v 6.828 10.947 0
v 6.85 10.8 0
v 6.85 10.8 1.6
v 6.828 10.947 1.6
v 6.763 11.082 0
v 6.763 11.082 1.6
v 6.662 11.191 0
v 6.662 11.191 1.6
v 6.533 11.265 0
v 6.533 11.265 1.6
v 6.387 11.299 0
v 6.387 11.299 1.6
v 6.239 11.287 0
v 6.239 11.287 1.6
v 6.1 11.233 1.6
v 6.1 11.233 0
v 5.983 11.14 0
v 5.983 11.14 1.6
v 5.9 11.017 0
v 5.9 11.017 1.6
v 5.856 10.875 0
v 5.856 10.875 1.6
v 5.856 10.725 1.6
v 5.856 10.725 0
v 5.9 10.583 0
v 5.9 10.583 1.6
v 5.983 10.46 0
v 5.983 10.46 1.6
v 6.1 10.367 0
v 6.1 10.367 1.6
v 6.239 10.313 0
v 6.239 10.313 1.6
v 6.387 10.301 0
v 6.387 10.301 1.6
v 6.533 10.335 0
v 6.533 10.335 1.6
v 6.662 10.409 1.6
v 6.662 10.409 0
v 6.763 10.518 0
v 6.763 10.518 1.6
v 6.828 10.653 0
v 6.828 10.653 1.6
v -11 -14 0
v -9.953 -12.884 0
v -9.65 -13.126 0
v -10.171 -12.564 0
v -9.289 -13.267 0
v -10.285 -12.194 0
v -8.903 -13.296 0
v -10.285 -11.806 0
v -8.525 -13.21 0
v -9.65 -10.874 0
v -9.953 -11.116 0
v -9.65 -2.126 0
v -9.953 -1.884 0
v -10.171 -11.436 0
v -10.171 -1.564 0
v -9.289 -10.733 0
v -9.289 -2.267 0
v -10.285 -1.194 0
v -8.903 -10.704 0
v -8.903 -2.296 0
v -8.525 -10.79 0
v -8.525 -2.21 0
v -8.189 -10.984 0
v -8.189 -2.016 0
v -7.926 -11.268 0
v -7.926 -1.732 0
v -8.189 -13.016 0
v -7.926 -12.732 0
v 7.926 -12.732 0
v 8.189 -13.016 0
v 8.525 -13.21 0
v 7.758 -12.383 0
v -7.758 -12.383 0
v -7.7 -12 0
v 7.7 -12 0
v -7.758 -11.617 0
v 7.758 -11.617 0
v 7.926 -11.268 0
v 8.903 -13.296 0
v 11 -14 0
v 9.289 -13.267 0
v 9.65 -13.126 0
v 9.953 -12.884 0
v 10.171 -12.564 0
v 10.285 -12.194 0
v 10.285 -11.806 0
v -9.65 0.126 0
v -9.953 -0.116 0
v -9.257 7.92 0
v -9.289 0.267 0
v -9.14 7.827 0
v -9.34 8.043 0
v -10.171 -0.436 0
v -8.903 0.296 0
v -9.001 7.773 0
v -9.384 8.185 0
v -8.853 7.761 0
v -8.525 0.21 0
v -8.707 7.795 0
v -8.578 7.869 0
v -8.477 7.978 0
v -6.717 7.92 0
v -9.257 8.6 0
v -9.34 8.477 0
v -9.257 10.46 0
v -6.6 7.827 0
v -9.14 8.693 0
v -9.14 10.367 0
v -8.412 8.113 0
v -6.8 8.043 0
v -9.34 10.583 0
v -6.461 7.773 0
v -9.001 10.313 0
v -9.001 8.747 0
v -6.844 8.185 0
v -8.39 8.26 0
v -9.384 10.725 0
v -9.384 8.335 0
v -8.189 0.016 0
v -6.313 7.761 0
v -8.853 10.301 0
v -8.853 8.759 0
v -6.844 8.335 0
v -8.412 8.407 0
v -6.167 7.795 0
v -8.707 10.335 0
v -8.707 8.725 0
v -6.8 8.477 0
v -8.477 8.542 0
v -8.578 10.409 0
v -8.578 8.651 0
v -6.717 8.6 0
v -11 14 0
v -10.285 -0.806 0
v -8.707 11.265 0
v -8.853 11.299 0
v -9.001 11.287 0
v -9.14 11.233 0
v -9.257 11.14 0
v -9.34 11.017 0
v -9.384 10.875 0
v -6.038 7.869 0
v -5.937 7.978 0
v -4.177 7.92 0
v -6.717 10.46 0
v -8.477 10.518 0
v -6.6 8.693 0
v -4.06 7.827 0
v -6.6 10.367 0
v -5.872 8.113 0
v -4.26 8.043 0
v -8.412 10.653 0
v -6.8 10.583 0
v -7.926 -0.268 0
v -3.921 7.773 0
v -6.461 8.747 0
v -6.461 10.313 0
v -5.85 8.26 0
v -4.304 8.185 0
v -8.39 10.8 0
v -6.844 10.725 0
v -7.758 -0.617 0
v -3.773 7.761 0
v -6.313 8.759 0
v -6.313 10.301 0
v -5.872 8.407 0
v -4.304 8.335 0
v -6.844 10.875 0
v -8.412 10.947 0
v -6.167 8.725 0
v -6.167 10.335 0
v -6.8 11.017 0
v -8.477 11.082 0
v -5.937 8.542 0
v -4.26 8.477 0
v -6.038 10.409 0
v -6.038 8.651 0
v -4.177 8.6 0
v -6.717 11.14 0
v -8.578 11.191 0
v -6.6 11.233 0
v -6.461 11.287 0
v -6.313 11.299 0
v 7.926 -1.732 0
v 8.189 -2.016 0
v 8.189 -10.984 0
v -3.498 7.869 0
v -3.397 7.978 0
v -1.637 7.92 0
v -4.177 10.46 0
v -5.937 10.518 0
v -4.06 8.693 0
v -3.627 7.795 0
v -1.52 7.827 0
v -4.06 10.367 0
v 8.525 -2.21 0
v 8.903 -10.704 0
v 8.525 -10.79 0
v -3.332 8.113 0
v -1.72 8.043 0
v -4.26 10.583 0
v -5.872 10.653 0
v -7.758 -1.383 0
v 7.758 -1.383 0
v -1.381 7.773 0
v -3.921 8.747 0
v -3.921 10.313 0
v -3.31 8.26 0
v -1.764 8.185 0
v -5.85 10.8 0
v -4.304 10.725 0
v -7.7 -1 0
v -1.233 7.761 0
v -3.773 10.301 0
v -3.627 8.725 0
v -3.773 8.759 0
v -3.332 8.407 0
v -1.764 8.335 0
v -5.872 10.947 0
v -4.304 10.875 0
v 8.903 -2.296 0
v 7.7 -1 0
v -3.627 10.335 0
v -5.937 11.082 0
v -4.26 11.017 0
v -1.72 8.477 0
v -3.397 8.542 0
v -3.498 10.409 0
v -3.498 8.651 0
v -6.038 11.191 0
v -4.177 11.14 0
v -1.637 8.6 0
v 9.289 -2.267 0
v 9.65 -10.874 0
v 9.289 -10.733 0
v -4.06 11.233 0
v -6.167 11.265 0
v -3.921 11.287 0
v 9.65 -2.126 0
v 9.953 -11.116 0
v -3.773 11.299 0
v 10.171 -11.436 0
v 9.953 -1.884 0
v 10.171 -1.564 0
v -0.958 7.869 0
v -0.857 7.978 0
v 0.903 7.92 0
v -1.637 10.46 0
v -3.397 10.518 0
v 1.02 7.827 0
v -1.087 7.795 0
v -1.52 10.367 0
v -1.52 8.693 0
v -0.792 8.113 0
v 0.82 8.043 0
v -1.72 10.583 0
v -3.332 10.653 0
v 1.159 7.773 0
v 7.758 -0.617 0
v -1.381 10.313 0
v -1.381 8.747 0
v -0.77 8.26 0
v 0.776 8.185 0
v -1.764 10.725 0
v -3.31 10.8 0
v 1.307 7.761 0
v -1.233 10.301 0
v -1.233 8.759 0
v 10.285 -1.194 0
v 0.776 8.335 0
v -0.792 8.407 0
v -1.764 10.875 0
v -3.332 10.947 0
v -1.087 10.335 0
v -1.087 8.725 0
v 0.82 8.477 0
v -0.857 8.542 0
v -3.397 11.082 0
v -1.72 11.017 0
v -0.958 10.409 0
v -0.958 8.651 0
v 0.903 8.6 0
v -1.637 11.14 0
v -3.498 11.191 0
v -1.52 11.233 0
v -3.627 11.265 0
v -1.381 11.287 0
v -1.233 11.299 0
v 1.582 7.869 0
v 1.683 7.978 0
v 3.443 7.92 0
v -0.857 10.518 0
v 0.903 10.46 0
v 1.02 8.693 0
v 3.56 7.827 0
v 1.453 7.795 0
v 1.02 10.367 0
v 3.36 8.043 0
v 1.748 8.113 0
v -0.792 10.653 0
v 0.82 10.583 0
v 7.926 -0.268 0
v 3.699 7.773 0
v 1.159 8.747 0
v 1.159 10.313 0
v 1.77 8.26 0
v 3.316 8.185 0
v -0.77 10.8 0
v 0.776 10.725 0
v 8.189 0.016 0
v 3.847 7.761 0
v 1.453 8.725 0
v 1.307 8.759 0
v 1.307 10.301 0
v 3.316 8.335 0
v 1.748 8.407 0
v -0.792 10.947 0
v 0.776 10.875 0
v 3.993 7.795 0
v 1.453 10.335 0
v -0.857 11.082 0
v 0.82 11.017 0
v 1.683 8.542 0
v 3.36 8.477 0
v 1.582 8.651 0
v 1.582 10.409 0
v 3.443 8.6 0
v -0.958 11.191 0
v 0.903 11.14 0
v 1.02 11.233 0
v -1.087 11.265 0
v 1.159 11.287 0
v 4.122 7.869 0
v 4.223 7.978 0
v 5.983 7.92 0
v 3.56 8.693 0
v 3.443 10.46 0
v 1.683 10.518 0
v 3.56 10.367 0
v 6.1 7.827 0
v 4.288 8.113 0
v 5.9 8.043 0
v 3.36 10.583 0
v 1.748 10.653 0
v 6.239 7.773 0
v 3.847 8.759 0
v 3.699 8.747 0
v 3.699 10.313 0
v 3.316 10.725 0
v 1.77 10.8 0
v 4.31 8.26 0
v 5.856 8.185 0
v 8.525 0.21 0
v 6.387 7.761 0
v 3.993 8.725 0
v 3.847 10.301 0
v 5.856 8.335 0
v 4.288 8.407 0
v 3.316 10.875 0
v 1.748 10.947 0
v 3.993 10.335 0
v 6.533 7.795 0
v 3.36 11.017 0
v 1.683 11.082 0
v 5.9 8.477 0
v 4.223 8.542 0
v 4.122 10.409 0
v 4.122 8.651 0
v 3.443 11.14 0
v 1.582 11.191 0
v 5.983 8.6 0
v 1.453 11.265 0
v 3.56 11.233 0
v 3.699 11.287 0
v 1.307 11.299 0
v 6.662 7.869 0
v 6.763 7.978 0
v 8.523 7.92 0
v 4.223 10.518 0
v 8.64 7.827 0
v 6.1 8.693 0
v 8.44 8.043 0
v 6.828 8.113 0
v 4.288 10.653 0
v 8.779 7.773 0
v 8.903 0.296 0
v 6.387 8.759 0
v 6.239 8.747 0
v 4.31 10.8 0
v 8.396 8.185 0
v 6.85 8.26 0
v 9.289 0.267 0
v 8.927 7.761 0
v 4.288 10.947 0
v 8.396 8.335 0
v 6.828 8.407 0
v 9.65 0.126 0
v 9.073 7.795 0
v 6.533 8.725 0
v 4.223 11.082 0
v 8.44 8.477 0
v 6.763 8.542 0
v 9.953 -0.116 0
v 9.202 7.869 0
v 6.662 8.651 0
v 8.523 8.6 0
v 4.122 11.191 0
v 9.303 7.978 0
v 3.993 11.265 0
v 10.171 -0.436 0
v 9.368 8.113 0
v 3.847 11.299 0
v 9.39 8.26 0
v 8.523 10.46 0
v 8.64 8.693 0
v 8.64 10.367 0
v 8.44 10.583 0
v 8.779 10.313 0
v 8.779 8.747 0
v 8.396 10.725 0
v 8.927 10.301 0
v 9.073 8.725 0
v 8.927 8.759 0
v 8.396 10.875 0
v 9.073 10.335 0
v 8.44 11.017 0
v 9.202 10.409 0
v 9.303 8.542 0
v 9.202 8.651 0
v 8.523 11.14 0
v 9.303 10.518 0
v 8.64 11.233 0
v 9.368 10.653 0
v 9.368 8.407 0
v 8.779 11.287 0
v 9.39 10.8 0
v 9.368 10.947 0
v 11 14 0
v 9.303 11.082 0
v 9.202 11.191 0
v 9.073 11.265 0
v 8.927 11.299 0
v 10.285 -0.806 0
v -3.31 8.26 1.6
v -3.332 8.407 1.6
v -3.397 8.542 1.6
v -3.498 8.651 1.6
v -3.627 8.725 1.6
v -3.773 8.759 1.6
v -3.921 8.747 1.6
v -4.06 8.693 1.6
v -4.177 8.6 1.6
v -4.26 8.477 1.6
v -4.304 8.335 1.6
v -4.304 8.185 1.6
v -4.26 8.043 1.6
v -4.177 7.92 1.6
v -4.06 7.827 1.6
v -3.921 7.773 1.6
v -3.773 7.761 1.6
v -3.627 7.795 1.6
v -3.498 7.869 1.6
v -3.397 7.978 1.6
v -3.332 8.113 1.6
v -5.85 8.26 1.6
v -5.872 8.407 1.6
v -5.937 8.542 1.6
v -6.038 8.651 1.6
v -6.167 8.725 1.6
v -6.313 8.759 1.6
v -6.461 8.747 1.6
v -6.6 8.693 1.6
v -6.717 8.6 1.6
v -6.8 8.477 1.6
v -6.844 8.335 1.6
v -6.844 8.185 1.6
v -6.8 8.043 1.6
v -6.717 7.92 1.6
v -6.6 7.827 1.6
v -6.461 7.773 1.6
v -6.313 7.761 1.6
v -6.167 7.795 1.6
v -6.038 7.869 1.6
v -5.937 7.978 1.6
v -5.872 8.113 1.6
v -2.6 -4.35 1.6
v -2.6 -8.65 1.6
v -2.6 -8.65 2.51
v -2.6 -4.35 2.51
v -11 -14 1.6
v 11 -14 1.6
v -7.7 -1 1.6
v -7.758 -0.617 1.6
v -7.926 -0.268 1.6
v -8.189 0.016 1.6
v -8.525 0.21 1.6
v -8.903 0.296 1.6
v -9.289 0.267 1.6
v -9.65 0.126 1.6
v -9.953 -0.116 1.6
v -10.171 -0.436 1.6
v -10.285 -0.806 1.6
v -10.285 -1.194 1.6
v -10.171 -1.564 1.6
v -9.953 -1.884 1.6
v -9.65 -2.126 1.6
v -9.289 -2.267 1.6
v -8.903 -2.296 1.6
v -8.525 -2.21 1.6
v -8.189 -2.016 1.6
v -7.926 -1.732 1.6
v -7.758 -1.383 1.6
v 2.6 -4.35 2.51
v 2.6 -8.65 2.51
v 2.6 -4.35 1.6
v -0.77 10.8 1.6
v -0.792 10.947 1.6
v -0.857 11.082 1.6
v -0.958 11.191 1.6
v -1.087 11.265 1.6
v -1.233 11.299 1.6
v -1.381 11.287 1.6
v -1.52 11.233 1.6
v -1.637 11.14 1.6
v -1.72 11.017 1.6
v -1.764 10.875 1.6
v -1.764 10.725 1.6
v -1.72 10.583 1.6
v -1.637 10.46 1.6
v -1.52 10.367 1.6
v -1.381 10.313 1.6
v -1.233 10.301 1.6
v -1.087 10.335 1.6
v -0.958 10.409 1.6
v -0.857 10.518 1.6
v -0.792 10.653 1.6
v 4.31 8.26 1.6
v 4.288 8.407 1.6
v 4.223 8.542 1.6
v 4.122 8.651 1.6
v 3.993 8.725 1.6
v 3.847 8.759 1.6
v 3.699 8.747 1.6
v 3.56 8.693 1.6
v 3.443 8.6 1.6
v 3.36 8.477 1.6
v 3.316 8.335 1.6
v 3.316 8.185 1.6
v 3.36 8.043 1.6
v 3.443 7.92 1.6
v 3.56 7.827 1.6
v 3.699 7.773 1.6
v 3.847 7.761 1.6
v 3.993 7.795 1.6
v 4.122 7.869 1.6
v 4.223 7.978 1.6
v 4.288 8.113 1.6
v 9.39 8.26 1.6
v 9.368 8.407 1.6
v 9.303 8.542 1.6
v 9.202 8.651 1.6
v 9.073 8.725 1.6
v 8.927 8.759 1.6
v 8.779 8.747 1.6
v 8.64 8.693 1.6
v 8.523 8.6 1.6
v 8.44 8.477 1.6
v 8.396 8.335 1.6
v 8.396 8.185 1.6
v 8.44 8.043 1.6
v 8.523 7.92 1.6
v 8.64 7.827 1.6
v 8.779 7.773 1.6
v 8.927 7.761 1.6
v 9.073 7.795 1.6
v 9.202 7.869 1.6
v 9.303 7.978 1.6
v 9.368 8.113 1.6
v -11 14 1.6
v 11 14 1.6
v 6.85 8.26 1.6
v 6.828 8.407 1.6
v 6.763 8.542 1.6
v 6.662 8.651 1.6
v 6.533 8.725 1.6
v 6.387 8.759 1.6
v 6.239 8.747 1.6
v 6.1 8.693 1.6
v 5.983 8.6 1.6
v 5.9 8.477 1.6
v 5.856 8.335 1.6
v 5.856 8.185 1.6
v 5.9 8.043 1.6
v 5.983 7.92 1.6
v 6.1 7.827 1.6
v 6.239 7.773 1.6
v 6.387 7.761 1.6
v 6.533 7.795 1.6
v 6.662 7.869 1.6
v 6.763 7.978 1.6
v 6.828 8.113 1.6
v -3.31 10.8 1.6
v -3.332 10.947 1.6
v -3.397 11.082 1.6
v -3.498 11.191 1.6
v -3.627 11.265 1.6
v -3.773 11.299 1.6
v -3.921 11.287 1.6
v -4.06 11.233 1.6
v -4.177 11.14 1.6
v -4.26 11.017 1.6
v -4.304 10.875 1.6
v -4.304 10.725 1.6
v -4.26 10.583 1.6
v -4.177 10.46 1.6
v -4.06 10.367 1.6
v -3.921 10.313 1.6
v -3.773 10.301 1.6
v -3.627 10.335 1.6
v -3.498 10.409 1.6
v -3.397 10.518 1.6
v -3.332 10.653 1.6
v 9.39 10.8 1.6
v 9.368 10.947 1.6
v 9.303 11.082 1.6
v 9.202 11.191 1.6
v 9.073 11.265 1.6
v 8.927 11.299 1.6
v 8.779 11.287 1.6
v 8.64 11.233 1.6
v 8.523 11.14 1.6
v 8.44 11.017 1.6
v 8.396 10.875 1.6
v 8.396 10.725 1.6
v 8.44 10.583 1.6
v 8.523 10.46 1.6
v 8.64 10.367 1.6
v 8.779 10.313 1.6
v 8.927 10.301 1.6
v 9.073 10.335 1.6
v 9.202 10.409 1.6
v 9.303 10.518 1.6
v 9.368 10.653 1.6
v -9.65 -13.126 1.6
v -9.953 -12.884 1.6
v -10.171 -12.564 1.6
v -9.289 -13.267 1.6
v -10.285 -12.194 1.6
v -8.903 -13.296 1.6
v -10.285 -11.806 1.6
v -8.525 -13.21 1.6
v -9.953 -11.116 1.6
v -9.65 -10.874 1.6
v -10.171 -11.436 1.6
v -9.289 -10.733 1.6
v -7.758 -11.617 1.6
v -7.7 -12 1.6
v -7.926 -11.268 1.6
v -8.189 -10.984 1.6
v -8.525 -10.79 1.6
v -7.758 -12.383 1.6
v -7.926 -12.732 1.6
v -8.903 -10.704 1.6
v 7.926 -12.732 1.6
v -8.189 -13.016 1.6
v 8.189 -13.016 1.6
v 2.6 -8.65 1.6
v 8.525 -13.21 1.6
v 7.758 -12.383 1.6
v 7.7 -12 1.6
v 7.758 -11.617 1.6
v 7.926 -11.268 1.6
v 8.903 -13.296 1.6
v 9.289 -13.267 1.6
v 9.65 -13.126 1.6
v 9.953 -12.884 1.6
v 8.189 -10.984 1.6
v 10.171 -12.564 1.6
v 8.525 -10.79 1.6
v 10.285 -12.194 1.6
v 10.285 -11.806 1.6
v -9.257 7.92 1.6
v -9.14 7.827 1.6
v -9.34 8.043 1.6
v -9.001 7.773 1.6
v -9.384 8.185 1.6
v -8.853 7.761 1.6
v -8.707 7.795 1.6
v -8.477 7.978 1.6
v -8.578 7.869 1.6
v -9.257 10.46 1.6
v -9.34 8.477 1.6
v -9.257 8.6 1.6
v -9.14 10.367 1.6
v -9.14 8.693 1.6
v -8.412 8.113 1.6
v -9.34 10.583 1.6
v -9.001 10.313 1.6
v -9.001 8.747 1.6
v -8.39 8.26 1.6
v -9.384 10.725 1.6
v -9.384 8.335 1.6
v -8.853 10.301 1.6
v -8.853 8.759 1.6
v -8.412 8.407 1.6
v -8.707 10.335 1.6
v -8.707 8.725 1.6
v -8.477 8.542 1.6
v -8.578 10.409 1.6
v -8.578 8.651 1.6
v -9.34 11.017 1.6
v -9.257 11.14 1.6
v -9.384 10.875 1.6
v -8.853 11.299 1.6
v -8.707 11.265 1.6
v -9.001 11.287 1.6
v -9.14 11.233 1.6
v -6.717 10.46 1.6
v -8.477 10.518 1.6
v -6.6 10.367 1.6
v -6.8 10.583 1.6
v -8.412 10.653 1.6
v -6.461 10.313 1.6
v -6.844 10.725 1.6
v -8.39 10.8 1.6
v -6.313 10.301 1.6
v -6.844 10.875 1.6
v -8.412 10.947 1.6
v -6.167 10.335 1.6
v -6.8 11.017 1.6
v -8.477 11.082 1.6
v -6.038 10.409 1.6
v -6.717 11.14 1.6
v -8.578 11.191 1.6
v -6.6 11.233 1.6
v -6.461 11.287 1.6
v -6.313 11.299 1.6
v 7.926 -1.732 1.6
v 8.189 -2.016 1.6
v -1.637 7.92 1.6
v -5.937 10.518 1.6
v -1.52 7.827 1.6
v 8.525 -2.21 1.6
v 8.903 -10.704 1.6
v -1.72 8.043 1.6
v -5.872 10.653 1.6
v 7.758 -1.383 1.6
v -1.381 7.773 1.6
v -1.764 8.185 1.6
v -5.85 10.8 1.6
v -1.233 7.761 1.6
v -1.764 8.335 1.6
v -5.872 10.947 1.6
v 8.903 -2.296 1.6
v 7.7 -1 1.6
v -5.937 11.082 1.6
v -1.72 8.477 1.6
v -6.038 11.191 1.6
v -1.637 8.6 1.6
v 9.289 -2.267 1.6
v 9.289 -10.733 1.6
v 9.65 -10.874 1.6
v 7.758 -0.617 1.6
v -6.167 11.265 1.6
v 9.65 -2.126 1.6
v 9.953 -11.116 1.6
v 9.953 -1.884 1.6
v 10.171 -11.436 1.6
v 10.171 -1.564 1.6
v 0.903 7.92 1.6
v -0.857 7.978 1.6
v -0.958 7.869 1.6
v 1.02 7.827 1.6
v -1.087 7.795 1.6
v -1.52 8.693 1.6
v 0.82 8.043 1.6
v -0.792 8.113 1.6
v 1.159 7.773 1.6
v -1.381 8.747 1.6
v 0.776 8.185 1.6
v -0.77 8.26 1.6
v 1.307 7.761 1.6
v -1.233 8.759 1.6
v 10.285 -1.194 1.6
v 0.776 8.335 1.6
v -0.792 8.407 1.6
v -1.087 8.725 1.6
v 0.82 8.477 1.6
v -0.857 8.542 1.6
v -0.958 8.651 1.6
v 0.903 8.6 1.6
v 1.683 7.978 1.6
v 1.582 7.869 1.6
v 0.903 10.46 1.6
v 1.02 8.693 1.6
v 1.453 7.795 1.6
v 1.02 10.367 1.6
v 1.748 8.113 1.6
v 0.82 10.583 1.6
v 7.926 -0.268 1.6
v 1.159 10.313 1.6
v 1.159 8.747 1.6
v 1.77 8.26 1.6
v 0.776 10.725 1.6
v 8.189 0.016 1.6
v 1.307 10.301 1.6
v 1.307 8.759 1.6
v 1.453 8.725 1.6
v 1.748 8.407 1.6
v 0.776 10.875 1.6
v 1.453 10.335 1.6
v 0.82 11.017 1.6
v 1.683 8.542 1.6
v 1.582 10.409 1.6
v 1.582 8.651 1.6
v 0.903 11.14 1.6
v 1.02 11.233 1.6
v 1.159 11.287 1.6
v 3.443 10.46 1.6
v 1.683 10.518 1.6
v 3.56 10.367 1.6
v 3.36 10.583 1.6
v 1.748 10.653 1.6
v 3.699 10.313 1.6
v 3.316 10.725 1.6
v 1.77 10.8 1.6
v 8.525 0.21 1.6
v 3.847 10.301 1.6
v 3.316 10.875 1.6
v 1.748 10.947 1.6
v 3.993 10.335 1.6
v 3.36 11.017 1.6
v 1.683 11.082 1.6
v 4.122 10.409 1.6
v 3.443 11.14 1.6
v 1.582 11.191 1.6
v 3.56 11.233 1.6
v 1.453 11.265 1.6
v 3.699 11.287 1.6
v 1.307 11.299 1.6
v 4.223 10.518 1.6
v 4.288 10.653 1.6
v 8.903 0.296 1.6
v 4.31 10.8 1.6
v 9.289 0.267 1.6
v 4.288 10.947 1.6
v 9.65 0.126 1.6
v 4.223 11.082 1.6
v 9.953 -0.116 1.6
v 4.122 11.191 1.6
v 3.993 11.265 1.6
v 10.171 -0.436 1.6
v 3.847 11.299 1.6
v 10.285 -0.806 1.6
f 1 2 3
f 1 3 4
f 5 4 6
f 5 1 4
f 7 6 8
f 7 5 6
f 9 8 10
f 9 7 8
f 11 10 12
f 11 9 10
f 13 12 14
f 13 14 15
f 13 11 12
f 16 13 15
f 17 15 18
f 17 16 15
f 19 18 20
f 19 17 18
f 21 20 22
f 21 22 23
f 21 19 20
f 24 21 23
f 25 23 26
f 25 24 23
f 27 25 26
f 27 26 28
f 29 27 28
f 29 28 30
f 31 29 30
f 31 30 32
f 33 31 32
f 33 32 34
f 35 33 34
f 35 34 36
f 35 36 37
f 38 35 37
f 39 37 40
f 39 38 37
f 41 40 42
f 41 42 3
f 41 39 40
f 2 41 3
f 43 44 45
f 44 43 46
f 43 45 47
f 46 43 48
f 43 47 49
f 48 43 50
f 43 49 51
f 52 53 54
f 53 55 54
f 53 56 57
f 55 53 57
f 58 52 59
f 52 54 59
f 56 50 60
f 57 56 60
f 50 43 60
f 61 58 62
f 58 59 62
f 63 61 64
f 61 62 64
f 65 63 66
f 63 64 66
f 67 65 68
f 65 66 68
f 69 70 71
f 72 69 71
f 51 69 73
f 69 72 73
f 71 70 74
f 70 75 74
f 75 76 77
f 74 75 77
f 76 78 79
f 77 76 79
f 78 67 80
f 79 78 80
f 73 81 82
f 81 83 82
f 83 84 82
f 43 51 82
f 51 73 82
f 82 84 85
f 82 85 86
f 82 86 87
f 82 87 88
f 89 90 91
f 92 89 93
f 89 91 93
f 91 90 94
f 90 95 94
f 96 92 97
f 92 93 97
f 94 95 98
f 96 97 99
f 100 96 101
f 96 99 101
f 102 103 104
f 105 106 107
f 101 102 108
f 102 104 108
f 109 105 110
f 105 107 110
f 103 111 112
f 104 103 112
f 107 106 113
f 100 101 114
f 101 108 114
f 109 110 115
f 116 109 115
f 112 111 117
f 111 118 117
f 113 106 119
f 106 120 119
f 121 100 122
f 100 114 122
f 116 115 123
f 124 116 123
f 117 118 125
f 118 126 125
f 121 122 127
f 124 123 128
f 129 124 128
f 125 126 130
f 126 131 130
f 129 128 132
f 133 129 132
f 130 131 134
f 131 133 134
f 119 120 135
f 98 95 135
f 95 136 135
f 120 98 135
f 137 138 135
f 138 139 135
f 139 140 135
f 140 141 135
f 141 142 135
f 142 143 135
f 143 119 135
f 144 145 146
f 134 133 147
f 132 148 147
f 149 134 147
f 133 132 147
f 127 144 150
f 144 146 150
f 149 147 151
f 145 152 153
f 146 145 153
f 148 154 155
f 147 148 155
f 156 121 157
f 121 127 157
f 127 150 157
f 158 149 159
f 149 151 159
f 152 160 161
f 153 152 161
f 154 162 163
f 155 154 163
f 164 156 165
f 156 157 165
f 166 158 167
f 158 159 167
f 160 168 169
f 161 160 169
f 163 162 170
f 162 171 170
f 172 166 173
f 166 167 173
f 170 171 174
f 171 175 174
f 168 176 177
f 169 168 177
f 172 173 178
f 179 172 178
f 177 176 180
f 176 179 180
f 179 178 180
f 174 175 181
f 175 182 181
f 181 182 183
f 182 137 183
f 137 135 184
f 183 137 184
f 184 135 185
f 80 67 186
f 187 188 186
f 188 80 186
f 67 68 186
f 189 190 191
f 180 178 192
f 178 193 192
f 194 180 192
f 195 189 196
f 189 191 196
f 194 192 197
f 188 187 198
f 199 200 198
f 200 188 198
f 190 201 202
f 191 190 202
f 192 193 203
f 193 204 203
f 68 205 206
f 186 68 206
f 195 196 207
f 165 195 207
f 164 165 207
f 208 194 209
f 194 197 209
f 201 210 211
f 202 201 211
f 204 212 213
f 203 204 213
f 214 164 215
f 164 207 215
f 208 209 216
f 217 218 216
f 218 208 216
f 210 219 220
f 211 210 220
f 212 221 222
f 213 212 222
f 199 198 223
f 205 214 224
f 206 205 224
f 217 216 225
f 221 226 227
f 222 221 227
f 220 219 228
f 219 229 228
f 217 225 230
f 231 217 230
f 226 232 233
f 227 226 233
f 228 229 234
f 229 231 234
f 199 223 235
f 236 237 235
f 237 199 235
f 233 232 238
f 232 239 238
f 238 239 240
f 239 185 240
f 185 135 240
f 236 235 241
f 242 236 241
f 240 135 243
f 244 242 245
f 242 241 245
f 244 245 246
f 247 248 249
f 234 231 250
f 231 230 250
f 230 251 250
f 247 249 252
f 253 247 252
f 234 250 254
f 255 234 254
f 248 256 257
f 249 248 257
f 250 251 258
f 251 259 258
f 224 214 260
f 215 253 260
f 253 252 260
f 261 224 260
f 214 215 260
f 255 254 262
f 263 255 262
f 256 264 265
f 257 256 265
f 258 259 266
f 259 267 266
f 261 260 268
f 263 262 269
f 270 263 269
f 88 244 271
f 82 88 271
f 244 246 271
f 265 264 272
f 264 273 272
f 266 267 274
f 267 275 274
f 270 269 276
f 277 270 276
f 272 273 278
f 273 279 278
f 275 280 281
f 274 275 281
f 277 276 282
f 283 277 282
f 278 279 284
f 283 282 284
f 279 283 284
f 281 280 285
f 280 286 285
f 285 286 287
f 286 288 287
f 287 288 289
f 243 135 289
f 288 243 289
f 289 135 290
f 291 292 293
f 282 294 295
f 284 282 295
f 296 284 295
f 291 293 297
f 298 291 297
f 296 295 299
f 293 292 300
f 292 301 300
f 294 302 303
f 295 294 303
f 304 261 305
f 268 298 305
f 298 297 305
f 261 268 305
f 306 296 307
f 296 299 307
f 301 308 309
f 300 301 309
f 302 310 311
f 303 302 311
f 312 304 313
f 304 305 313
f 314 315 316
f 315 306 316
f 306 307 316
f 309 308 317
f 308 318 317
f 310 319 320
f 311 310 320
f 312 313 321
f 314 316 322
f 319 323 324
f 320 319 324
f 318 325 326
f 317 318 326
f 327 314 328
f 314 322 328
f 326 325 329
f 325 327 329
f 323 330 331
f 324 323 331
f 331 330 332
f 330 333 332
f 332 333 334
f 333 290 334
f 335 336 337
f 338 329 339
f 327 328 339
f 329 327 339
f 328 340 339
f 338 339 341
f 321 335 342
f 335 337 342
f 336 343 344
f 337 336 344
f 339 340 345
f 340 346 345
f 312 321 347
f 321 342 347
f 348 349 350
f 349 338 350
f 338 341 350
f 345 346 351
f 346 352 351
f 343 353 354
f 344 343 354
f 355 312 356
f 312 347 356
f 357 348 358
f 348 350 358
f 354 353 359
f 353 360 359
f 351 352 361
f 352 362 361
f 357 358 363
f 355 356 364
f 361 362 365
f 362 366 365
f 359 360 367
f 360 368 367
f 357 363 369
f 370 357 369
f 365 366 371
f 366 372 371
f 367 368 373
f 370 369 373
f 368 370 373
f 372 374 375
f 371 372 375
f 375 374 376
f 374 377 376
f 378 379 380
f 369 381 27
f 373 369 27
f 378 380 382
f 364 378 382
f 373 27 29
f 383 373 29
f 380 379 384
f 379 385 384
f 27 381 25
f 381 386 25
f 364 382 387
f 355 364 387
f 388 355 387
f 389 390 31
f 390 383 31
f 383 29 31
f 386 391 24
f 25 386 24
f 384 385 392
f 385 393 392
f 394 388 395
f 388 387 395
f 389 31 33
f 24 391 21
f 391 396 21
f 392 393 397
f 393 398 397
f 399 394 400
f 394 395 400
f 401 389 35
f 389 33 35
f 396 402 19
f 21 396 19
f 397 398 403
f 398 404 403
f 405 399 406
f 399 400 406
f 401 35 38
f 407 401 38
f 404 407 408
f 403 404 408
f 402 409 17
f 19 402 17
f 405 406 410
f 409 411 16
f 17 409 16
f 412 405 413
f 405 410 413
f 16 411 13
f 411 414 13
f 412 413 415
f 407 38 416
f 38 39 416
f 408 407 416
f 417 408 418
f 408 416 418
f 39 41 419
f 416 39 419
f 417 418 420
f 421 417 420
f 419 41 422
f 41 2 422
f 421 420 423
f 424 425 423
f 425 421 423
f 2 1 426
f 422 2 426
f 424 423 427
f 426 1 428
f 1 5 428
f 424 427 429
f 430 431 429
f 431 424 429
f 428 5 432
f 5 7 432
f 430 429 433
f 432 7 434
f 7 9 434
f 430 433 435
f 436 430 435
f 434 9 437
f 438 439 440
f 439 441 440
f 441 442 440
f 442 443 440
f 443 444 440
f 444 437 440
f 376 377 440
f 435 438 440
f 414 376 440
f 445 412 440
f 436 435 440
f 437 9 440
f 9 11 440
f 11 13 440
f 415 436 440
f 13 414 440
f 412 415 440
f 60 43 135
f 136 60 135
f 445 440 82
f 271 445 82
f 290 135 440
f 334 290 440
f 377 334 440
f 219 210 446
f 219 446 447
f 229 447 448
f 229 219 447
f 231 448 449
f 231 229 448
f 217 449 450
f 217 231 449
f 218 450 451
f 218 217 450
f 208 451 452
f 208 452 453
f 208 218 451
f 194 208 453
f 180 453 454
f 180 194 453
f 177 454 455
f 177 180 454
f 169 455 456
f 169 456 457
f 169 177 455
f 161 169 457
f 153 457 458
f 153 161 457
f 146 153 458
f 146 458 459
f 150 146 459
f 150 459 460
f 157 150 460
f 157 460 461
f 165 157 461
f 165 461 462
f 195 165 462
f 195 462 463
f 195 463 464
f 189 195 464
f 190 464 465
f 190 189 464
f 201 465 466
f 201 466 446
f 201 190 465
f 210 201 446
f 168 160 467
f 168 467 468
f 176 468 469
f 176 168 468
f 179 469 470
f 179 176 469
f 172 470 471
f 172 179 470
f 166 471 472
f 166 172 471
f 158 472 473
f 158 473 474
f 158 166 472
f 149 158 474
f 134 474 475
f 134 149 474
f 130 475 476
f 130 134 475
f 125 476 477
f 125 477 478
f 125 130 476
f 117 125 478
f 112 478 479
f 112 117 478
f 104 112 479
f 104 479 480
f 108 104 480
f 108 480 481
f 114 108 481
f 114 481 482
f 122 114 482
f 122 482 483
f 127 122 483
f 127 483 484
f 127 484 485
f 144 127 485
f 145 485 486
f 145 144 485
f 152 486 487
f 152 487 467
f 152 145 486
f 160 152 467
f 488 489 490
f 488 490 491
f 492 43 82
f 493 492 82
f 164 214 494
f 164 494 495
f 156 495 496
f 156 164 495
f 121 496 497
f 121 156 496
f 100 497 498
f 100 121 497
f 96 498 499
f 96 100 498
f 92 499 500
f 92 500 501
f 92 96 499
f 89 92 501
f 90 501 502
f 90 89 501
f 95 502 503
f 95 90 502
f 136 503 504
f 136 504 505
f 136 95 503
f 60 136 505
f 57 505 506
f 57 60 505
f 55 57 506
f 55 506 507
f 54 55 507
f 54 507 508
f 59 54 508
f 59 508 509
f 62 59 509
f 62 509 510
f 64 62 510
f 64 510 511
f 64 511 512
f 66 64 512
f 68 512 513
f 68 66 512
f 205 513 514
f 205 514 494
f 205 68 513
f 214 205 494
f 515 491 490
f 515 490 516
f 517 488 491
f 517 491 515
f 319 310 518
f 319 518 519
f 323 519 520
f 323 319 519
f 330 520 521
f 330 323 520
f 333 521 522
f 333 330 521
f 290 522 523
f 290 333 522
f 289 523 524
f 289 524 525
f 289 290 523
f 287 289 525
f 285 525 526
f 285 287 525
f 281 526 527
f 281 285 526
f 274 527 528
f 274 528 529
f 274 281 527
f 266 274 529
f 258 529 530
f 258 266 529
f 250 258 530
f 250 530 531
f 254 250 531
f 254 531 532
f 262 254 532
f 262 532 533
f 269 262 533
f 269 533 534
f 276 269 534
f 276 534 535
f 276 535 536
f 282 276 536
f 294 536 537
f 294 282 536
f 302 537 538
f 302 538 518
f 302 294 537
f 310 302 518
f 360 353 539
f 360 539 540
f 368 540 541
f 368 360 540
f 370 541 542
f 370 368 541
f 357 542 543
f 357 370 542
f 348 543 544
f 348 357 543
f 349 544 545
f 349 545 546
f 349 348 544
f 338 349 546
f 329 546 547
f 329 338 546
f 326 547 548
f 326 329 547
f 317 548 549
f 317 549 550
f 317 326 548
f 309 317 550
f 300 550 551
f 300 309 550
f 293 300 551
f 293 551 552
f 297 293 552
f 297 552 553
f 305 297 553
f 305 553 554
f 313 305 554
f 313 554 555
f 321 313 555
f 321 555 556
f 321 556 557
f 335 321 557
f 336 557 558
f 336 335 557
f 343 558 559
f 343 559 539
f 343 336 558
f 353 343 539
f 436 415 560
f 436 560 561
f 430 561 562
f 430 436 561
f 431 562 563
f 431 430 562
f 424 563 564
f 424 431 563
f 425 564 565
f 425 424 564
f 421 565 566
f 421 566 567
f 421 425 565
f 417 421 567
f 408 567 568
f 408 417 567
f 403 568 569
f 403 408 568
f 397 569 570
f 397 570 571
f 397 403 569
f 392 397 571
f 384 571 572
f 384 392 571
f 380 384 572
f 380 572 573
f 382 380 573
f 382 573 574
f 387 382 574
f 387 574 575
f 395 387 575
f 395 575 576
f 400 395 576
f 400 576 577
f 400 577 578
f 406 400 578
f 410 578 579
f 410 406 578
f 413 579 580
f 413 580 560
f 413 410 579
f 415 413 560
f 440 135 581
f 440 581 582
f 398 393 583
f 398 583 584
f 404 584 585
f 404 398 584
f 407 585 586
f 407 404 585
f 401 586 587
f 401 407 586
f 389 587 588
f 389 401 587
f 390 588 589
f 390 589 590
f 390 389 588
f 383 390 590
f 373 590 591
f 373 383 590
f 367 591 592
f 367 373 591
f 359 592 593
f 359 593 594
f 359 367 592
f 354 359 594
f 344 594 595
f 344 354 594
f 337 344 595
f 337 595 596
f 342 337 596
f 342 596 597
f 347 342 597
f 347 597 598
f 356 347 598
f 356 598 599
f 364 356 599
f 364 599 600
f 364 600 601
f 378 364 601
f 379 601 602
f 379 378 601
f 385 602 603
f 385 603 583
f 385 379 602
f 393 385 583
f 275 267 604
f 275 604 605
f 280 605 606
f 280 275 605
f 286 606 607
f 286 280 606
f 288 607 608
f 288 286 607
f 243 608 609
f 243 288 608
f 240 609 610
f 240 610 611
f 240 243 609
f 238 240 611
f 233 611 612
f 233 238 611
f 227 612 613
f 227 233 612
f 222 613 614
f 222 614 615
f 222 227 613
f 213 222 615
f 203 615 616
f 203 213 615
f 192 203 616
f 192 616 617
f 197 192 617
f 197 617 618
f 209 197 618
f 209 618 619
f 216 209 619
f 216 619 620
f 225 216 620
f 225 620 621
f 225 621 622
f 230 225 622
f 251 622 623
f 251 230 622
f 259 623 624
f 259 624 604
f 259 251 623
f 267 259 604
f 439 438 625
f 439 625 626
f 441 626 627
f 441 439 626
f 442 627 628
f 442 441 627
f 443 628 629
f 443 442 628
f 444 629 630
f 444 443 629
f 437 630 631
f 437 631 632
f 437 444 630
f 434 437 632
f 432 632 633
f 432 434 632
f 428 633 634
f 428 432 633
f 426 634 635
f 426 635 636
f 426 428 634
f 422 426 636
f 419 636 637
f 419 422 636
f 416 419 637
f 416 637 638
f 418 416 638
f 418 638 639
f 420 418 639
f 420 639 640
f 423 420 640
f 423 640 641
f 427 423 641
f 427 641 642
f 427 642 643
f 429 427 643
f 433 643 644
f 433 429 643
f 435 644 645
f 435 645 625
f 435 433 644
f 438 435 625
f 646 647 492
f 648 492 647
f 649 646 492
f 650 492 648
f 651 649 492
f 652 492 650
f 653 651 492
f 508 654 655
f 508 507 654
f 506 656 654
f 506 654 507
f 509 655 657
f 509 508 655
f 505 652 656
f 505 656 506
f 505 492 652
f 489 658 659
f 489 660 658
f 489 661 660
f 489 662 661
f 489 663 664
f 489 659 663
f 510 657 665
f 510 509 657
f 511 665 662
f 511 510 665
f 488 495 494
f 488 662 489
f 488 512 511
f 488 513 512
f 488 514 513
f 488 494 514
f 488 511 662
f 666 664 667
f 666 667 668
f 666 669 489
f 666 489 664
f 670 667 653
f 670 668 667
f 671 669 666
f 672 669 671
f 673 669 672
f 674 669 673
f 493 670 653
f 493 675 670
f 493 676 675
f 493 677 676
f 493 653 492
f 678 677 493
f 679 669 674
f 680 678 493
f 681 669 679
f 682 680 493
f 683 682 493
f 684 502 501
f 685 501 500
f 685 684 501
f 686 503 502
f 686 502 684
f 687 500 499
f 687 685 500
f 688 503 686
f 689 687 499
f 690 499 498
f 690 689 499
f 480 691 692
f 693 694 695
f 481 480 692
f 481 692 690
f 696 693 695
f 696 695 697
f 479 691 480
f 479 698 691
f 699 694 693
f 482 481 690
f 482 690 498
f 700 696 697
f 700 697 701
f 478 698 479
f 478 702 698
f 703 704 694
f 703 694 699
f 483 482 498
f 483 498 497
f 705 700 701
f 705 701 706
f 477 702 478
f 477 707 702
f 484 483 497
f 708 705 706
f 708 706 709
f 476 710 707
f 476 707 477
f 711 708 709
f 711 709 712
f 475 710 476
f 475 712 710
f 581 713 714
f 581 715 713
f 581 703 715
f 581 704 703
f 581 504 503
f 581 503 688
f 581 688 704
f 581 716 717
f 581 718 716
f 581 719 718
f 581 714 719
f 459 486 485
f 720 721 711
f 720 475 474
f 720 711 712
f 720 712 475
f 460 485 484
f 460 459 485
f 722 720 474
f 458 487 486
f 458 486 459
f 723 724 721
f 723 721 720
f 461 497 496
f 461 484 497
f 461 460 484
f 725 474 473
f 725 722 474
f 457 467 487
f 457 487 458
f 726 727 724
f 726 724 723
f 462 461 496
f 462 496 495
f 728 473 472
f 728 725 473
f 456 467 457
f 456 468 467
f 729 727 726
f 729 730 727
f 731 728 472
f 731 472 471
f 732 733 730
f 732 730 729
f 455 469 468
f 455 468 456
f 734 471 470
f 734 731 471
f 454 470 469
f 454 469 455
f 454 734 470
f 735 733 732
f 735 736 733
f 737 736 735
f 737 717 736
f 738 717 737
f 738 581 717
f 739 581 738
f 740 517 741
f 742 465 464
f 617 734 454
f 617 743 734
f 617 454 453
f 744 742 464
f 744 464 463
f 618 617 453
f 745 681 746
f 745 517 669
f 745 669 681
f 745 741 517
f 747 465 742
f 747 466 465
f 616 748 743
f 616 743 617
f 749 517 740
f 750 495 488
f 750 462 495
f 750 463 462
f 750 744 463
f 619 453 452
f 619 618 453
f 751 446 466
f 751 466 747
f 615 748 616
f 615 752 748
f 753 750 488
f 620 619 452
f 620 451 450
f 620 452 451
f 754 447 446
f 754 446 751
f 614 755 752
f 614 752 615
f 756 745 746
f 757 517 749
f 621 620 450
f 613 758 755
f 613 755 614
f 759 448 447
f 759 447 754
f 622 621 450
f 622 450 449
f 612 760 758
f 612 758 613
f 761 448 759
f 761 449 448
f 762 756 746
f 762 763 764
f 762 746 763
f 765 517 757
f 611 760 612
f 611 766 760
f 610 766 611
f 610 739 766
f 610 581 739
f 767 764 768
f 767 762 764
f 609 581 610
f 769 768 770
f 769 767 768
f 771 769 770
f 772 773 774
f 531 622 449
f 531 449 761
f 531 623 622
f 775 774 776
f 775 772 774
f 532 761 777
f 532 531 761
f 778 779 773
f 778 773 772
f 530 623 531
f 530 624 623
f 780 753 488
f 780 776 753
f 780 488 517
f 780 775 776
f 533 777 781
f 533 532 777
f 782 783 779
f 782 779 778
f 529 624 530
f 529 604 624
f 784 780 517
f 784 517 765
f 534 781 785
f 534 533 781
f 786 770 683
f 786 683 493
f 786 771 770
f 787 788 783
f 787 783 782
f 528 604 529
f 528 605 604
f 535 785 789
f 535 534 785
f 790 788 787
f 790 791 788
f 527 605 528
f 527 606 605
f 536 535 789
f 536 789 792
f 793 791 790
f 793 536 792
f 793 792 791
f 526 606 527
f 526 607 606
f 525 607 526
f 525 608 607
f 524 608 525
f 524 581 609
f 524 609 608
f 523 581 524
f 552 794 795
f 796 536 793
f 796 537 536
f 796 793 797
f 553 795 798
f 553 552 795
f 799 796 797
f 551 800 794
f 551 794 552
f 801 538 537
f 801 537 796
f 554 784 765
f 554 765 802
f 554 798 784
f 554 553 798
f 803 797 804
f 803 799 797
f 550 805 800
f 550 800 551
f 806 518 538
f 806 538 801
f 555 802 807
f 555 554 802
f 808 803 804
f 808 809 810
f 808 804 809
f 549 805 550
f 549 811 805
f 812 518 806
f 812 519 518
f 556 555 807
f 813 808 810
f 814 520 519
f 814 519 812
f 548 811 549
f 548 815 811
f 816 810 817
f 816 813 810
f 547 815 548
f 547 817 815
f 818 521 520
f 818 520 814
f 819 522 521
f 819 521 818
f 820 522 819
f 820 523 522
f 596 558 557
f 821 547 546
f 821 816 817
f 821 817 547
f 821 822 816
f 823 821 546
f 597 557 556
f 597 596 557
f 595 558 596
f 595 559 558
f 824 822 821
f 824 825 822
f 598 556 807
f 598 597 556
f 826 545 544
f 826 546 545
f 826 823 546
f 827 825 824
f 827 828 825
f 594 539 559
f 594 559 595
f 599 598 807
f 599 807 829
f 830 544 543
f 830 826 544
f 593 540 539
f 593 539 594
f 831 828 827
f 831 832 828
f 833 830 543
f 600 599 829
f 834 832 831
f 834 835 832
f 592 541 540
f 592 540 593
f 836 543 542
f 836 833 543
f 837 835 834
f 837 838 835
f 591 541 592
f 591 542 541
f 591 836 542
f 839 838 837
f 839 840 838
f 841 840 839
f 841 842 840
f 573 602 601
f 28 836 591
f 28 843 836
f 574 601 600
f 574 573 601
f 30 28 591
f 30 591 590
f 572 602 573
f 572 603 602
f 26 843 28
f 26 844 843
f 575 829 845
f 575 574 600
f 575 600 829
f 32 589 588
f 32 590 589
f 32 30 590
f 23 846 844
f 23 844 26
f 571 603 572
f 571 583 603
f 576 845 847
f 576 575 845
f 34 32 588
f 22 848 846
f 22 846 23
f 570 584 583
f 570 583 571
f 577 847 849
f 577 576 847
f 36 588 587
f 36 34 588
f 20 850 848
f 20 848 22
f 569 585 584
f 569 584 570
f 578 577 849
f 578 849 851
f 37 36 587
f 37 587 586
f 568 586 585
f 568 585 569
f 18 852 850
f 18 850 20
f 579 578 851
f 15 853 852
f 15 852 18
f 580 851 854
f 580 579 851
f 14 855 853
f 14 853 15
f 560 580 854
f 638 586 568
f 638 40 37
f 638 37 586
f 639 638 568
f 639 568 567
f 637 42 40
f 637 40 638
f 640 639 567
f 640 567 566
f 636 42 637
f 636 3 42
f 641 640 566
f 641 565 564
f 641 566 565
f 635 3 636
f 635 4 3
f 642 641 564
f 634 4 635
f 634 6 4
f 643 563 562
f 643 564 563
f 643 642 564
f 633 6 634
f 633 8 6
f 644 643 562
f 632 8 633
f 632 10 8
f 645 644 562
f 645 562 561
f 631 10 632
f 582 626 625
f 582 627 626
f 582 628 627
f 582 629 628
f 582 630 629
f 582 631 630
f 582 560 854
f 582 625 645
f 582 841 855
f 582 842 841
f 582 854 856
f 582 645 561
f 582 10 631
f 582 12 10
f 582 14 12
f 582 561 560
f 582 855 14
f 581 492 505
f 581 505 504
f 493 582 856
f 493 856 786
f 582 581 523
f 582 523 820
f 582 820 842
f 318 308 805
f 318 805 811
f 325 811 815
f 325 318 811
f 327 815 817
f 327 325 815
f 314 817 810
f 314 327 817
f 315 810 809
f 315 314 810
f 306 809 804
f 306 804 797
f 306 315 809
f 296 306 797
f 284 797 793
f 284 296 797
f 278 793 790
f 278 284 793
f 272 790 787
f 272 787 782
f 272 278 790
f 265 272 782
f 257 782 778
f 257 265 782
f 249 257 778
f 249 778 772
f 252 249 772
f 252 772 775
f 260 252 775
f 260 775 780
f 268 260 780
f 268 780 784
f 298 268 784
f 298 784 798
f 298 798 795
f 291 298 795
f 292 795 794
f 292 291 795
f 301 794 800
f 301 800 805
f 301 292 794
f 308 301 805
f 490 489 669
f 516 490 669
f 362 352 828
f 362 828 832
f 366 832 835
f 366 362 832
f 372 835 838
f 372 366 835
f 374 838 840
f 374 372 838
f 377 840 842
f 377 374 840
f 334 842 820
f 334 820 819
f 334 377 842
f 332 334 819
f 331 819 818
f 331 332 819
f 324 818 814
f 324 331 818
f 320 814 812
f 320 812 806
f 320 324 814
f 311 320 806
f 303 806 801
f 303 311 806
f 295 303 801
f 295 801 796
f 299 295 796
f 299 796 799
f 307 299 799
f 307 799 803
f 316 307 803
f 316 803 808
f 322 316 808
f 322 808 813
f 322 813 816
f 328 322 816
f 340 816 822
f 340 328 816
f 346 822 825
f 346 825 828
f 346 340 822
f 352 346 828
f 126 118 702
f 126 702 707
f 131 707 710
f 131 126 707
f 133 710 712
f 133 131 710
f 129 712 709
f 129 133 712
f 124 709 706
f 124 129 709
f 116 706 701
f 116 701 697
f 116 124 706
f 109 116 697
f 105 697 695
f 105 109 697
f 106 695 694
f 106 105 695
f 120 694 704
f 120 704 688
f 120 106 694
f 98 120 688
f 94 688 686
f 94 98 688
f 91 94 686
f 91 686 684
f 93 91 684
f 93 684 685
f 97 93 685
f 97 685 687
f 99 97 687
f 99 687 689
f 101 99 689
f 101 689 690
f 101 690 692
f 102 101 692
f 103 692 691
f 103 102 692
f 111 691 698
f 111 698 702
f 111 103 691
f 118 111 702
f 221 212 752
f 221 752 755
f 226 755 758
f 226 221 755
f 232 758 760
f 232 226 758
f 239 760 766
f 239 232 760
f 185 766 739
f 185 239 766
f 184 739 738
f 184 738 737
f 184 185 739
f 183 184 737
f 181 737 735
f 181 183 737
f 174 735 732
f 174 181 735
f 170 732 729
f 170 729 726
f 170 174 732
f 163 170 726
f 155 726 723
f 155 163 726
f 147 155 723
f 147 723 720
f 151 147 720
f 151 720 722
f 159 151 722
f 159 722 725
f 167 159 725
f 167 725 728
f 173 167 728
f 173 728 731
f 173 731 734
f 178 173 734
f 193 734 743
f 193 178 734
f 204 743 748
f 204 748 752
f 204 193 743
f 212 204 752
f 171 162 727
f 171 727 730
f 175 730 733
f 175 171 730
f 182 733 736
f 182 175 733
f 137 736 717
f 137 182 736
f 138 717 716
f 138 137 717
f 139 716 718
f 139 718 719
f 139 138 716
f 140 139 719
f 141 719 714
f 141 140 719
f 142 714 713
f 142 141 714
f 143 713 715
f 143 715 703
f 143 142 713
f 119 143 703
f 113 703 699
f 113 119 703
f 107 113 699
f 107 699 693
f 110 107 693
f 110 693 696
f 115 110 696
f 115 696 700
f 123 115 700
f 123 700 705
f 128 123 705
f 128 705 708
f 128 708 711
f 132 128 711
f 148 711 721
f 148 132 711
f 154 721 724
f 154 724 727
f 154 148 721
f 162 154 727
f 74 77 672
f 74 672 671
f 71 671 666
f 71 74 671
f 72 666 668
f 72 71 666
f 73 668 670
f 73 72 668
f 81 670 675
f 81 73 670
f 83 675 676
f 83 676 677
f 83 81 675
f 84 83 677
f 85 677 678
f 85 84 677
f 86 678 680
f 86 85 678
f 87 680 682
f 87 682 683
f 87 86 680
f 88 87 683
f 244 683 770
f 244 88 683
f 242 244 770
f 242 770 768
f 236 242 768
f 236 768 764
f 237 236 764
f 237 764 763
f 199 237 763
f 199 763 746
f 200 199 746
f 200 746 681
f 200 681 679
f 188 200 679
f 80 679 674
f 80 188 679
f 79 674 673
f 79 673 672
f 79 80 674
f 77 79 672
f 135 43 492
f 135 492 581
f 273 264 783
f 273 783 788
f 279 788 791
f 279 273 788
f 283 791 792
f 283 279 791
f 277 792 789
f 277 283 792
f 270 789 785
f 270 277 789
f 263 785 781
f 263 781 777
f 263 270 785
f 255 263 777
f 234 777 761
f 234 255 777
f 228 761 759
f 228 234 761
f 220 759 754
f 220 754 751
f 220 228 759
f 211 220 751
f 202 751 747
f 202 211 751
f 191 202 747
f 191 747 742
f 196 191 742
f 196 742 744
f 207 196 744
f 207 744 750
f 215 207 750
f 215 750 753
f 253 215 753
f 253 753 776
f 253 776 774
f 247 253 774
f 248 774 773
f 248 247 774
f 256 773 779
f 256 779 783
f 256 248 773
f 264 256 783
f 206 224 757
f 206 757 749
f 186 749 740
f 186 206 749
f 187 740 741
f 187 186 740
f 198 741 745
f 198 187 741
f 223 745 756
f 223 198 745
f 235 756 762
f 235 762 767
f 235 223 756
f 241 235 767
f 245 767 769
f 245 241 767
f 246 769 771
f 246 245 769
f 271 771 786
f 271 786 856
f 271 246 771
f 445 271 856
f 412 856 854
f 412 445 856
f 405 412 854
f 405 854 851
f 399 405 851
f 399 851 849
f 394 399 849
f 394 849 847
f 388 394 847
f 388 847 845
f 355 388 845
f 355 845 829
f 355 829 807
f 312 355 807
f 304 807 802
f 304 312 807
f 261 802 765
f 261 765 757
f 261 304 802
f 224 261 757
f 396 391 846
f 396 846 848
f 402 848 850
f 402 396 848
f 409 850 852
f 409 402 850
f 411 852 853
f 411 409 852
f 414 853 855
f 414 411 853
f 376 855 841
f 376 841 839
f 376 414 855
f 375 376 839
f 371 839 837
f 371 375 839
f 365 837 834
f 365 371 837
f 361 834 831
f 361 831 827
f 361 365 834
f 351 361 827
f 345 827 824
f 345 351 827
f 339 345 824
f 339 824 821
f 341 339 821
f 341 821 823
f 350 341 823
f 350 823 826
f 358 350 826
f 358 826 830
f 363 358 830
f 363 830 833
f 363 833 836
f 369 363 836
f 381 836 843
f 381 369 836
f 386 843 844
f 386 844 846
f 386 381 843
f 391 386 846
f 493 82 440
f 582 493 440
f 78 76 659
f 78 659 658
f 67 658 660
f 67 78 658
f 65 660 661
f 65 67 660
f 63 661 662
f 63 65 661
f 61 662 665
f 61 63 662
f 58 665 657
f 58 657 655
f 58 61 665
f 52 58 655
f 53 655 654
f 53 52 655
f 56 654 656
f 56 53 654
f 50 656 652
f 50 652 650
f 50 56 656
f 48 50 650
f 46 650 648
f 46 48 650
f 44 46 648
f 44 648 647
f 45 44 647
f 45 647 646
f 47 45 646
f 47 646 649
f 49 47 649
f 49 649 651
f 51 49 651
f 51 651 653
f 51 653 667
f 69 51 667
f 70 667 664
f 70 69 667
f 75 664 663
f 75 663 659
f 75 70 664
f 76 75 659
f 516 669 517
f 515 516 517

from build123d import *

# Parameters (mm, degrees)
SKETCH_1_W      = 22
SKETCH_1_H      = 28
SKETCH_1_R      = 1.3
SKETCH_1_R_2    = 0.5
EXTRUDE_1_DEPTH = 1.6
SKETCH_2_W      = 5.2
SKETCH_2_H      = 4.3
EXTRUDE_2_DEPTH = 0.91


with BuildPart() as part:
    # 草图1 → 凸台-拉伸1 (new body)
    with BuildSketch(Plane.XY):
        Rectangle(SKETCH_1_W, SKETCH_1_H)
        with Locations((-9, -1)):
            Circle(SKETCH_1_R, mode=Mode.SUBTRACT)
        with Locations((-9, -12)):
            Circle(SKETCH_1_R, mode=Mode.SUBTRACT)
        with Locations(Location((9, -12, 0), (0, 0, 180))):
            Circle(SKETCH_1_R, mode=Mode.SUBTRACT)
        with Locations(Location((9, -1, 0), (0, 0, 180))):
            Circle(SKETCH_1_R, mode=Mode.SUBTRACT)
        with Locations((-8.89, 10.8)):
            Circle(SKETCH_1_R_2, mode=Mode.SUBTRACT)
        with Locations((-6.35, 10.8)):
            Circle(SKETCH_1_R_2, mode=Mode.SUBTRACT)
        with Locations((-3.81, 10.8)):
            Circle(SKETCH_1_R_2, mode=Mode.SUBTRACT)
        with Locations((-1.27, 10.8)):
            Circle(SKETCH_1_R_2, mode=Mode.SUBTRACT)
        with Locations((1.27, 10.8)):
            Circle(SKETCH_1_R_2, mode=Mode.SUBTRACT)
        with Locations((3.81, 10.8)):
            Circle(SKETCH_1_R_2, mode=Mode.SUBTRACT)
        with Locations((6.35, 10.8)):
            Circle(SKETCH_1_R_2, mode=Mode.SUBTRACT)
        with Locations((8.89, 10.8)):
            Circle(SKETCH_1_R_2, mode=Mode.SUBTRACT)
        with Locations((-6.35, 8.26)):
            Circle(SKETCH_1_R_2, mode=Mode.SUBTRACT)
        with Locations((-3.81, 8.26)):
            Circle(SKETCH_1_R_2, mode=Mode.SUBTRACT)
        with Locations((-1.27, 8.26)):
            Circle(SKETCH_1_R_2, mode=Mode.SUBTRACT)
        with Locations((1.27, 8.26)):
            Circle(SKETCH_1_R_2, mode=Mode.SUBTRACT)
        with Locations((3.81, 8.26)):
            Circle(SKETCH_1_R_2, mode=Mode.SUBTRACT)
        with Locations((6.35, 8.26)):
            Circle(SKETCH_1_R_2, mode=Mode.SUBTRACT)
        with Locations((8.89, 8.26)):
            Circle(SKETCH_1_R_2, mode=Mode.SUBTRACT)
        with Locations((-8.89, 8.26)):
            Circle(SKETCH_1_R_2, mode=Mode.SUBTRACT)
    extrude(amount=EXTRUDE_1_DEPTH)

    # 草图2 → 凸台-拉伸2 (add)
    with BuildSketch(Plane.XY.offset(1.6)):
        with Locations((0, -6.5)):
            Rectangle(SKETCH_2_W, SKETCH_2_H)
    extrude(amount=EXTRUDE_2_DEPTH)


solid = part.part
